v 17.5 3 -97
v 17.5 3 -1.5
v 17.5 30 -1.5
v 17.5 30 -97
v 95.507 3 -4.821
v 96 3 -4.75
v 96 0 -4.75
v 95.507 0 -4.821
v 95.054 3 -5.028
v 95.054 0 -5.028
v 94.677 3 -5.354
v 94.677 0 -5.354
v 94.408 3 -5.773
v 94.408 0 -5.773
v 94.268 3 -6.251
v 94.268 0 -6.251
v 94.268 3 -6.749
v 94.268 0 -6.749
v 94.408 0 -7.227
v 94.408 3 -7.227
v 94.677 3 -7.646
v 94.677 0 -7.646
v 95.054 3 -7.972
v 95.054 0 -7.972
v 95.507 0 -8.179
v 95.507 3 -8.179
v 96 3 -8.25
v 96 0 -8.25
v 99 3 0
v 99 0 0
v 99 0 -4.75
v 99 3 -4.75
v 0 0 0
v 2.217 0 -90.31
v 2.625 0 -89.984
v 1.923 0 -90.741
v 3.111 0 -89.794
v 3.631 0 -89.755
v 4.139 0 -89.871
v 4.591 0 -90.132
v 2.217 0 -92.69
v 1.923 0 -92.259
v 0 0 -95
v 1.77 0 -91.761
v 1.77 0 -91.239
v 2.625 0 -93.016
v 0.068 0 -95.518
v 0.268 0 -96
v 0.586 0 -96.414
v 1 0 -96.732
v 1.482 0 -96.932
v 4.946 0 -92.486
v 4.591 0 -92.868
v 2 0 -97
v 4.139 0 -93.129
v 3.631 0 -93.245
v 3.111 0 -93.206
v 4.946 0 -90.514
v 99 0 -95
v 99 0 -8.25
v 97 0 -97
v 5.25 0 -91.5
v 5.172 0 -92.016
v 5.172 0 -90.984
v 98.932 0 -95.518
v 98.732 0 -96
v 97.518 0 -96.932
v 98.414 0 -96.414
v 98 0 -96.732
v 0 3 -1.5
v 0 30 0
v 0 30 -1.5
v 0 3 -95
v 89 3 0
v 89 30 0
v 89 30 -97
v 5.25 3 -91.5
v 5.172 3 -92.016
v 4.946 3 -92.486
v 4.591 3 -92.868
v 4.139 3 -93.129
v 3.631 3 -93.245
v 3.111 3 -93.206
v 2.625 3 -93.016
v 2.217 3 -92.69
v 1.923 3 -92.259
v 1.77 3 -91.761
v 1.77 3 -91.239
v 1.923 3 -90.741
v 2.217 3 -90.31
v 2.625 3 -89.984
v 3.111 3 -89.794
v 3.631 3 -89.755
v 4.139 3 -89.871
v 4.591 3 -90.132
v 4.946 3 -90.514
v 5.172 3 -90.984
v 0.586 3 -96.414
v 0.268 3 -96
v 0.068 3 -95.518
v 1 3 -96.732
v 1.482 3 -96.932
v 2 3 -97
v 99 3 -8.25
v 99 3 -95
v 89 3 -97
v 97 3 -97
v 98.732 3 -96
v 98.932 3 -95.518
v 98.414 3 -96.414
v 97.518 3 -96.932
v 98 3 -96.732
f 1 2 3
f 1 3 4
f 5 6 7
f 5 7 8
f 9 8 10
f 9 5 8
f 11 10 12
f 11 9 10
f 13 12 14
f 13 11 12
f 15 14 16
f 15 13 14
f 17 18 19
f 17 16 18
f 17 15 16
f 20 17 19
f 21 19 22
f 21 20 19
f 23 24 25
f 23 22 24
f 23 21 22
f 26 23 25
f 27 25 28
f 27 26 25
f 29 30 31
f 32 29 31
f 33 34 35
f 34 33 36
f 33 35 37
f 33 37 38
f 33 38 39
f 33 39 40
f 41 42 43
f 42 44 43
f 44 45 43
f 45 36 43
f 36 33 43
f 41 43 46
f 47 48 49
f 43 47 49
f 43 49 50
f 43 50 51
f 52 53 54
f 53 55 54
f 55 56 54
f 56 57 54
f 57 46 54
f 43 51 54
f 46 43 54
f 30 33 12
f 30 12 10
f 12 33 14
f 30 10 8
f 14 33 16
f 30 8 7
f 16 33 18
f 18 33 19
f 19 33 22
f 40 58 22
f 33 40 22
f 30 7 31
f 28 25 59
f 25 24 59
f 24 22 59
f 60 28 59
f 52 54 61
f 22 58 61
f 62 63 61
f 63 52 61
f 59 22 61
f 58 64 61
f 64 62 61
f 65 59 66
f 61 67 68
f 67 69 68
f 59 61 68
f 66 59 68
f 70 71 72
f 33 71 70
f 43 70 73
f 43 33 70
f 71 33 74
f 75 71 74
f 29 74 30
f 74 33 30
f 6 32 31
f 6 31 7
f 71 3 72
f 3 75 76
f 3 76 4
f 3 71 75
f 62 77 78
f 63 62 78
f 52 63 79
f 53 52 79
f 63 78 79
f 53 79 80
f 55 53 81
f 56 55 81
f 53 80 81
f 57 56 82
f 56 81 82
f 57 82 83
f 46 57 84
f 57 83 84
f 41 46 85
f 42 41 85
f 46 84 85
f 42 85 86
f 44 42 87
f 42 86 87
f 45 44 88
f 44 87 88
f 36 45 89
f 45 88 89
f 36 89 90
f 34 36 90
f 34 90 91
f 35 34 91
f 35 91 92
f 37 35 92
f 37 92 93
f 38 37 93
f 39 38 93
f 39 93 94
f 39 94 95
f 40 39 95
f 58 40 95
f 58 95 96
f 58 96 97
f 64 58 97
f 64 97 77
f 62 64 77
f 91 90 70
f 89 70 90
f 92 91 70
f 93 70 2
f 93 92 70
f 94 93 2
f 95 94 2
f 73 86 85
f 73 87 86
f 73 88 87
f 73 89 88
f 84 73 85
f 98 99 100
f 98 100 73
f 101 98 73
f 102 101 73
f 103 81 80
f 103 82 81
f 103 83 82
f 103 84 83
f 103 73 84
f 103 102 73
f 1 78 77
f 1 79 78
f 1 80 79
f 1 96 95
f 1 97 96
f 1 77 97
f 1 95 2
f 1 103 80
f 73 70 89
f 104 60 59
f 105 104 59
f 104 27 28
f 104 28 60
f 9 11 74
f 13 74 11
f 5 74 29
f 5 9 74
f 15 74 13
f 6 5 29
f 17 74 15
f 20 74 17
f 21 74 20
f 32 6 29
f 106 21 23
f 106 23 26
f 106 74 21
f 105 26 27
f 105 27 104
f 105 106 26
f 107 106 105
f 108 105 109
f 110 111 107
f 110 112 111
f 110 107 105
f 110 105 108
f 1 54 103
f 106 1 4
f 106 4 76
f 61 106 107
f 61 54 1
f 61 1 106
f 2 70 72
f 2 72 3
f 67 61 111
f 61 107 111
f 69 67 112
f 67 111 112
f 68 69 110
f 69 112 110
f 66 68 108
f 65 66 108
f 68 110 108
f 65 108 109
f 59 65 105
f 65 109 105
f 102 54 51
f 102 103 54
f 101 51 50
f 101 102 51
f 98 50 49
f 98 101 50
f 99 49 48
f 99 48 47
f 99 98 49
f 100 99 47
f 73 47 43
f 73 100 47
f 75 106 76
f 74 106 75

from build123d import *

# Parameters (mm, degrees)
SKETCH2_W           = 99
SKETCH2_H           = 97
BOSS_EXTRUDE1_DEPTH = 3
BOSS_EXTRUDE2_DEPTH = 27
SKETCH5_R           = 1.75
CUT_EXTRUDE1_DEPTH  = 4
FILLET1_R           = 2


with BuildPart() as part:
    # Sketch2 → Boss-Extrude1 (new body)
    with BuildSketch(Plane(origin=(0, 0, 0), x_dir=(1, 0, 0), z_dir=(0, 1, 0))):
        with Locations((49.5, 48.5)):
            Rectangle(SKETCH2_W, SKETCH2_H)
    extrude(amount=BOSS_EXTRUDE1_DEPTH)

    # Sketch4 → Boss-Extrude2 (add)
    with BuildSketch(Plane(origin=(0, 3, 0), x_dir=(1, 0, 0), z_dir=(0, 1, 0))):
        Polygon((17.5, 97), (89, 97), (89, 0), (17.5, 0), (0, 0), (0, 1.5), (17.5, 1.5), align=None)
    extrude(amount=BOSS_EXTRUDE2_DEPTH)

    # Sketch5 → Cut-Extrude1 (cut, through all)
    with BuildSketch(Plane(origin=(0, 3, 0), x_dir=(1, 0, 0), z_dir=(0, 1, 0))):
        with Locations((3.5, 91.5)):
            Circle(SKETCH5_R)
        with BuildLine():
            Line((96, 8.25), (99, 8.25))
            Line((99, 8.25), (99, 4.75))
            Line((99, 4.75), (96, 4.75))
            ThreePointArc((96, 4.75), (94.25, 6.5), (96, 8.25))
        make_face()
    extrude(amount=-CUT_EXTRUDE1_DEPTH, mode=Mode.SUBTRACT)

    # Fillet1
    fillet1_edges = [part.edges().sort_by_distance(p)[0] for p in [
        (0, 1.5, -97),
        (99, 1.5, -97),
    ]]
    fillet(fillet1_edges, radius=FILLET1_R)


solid = part.part
